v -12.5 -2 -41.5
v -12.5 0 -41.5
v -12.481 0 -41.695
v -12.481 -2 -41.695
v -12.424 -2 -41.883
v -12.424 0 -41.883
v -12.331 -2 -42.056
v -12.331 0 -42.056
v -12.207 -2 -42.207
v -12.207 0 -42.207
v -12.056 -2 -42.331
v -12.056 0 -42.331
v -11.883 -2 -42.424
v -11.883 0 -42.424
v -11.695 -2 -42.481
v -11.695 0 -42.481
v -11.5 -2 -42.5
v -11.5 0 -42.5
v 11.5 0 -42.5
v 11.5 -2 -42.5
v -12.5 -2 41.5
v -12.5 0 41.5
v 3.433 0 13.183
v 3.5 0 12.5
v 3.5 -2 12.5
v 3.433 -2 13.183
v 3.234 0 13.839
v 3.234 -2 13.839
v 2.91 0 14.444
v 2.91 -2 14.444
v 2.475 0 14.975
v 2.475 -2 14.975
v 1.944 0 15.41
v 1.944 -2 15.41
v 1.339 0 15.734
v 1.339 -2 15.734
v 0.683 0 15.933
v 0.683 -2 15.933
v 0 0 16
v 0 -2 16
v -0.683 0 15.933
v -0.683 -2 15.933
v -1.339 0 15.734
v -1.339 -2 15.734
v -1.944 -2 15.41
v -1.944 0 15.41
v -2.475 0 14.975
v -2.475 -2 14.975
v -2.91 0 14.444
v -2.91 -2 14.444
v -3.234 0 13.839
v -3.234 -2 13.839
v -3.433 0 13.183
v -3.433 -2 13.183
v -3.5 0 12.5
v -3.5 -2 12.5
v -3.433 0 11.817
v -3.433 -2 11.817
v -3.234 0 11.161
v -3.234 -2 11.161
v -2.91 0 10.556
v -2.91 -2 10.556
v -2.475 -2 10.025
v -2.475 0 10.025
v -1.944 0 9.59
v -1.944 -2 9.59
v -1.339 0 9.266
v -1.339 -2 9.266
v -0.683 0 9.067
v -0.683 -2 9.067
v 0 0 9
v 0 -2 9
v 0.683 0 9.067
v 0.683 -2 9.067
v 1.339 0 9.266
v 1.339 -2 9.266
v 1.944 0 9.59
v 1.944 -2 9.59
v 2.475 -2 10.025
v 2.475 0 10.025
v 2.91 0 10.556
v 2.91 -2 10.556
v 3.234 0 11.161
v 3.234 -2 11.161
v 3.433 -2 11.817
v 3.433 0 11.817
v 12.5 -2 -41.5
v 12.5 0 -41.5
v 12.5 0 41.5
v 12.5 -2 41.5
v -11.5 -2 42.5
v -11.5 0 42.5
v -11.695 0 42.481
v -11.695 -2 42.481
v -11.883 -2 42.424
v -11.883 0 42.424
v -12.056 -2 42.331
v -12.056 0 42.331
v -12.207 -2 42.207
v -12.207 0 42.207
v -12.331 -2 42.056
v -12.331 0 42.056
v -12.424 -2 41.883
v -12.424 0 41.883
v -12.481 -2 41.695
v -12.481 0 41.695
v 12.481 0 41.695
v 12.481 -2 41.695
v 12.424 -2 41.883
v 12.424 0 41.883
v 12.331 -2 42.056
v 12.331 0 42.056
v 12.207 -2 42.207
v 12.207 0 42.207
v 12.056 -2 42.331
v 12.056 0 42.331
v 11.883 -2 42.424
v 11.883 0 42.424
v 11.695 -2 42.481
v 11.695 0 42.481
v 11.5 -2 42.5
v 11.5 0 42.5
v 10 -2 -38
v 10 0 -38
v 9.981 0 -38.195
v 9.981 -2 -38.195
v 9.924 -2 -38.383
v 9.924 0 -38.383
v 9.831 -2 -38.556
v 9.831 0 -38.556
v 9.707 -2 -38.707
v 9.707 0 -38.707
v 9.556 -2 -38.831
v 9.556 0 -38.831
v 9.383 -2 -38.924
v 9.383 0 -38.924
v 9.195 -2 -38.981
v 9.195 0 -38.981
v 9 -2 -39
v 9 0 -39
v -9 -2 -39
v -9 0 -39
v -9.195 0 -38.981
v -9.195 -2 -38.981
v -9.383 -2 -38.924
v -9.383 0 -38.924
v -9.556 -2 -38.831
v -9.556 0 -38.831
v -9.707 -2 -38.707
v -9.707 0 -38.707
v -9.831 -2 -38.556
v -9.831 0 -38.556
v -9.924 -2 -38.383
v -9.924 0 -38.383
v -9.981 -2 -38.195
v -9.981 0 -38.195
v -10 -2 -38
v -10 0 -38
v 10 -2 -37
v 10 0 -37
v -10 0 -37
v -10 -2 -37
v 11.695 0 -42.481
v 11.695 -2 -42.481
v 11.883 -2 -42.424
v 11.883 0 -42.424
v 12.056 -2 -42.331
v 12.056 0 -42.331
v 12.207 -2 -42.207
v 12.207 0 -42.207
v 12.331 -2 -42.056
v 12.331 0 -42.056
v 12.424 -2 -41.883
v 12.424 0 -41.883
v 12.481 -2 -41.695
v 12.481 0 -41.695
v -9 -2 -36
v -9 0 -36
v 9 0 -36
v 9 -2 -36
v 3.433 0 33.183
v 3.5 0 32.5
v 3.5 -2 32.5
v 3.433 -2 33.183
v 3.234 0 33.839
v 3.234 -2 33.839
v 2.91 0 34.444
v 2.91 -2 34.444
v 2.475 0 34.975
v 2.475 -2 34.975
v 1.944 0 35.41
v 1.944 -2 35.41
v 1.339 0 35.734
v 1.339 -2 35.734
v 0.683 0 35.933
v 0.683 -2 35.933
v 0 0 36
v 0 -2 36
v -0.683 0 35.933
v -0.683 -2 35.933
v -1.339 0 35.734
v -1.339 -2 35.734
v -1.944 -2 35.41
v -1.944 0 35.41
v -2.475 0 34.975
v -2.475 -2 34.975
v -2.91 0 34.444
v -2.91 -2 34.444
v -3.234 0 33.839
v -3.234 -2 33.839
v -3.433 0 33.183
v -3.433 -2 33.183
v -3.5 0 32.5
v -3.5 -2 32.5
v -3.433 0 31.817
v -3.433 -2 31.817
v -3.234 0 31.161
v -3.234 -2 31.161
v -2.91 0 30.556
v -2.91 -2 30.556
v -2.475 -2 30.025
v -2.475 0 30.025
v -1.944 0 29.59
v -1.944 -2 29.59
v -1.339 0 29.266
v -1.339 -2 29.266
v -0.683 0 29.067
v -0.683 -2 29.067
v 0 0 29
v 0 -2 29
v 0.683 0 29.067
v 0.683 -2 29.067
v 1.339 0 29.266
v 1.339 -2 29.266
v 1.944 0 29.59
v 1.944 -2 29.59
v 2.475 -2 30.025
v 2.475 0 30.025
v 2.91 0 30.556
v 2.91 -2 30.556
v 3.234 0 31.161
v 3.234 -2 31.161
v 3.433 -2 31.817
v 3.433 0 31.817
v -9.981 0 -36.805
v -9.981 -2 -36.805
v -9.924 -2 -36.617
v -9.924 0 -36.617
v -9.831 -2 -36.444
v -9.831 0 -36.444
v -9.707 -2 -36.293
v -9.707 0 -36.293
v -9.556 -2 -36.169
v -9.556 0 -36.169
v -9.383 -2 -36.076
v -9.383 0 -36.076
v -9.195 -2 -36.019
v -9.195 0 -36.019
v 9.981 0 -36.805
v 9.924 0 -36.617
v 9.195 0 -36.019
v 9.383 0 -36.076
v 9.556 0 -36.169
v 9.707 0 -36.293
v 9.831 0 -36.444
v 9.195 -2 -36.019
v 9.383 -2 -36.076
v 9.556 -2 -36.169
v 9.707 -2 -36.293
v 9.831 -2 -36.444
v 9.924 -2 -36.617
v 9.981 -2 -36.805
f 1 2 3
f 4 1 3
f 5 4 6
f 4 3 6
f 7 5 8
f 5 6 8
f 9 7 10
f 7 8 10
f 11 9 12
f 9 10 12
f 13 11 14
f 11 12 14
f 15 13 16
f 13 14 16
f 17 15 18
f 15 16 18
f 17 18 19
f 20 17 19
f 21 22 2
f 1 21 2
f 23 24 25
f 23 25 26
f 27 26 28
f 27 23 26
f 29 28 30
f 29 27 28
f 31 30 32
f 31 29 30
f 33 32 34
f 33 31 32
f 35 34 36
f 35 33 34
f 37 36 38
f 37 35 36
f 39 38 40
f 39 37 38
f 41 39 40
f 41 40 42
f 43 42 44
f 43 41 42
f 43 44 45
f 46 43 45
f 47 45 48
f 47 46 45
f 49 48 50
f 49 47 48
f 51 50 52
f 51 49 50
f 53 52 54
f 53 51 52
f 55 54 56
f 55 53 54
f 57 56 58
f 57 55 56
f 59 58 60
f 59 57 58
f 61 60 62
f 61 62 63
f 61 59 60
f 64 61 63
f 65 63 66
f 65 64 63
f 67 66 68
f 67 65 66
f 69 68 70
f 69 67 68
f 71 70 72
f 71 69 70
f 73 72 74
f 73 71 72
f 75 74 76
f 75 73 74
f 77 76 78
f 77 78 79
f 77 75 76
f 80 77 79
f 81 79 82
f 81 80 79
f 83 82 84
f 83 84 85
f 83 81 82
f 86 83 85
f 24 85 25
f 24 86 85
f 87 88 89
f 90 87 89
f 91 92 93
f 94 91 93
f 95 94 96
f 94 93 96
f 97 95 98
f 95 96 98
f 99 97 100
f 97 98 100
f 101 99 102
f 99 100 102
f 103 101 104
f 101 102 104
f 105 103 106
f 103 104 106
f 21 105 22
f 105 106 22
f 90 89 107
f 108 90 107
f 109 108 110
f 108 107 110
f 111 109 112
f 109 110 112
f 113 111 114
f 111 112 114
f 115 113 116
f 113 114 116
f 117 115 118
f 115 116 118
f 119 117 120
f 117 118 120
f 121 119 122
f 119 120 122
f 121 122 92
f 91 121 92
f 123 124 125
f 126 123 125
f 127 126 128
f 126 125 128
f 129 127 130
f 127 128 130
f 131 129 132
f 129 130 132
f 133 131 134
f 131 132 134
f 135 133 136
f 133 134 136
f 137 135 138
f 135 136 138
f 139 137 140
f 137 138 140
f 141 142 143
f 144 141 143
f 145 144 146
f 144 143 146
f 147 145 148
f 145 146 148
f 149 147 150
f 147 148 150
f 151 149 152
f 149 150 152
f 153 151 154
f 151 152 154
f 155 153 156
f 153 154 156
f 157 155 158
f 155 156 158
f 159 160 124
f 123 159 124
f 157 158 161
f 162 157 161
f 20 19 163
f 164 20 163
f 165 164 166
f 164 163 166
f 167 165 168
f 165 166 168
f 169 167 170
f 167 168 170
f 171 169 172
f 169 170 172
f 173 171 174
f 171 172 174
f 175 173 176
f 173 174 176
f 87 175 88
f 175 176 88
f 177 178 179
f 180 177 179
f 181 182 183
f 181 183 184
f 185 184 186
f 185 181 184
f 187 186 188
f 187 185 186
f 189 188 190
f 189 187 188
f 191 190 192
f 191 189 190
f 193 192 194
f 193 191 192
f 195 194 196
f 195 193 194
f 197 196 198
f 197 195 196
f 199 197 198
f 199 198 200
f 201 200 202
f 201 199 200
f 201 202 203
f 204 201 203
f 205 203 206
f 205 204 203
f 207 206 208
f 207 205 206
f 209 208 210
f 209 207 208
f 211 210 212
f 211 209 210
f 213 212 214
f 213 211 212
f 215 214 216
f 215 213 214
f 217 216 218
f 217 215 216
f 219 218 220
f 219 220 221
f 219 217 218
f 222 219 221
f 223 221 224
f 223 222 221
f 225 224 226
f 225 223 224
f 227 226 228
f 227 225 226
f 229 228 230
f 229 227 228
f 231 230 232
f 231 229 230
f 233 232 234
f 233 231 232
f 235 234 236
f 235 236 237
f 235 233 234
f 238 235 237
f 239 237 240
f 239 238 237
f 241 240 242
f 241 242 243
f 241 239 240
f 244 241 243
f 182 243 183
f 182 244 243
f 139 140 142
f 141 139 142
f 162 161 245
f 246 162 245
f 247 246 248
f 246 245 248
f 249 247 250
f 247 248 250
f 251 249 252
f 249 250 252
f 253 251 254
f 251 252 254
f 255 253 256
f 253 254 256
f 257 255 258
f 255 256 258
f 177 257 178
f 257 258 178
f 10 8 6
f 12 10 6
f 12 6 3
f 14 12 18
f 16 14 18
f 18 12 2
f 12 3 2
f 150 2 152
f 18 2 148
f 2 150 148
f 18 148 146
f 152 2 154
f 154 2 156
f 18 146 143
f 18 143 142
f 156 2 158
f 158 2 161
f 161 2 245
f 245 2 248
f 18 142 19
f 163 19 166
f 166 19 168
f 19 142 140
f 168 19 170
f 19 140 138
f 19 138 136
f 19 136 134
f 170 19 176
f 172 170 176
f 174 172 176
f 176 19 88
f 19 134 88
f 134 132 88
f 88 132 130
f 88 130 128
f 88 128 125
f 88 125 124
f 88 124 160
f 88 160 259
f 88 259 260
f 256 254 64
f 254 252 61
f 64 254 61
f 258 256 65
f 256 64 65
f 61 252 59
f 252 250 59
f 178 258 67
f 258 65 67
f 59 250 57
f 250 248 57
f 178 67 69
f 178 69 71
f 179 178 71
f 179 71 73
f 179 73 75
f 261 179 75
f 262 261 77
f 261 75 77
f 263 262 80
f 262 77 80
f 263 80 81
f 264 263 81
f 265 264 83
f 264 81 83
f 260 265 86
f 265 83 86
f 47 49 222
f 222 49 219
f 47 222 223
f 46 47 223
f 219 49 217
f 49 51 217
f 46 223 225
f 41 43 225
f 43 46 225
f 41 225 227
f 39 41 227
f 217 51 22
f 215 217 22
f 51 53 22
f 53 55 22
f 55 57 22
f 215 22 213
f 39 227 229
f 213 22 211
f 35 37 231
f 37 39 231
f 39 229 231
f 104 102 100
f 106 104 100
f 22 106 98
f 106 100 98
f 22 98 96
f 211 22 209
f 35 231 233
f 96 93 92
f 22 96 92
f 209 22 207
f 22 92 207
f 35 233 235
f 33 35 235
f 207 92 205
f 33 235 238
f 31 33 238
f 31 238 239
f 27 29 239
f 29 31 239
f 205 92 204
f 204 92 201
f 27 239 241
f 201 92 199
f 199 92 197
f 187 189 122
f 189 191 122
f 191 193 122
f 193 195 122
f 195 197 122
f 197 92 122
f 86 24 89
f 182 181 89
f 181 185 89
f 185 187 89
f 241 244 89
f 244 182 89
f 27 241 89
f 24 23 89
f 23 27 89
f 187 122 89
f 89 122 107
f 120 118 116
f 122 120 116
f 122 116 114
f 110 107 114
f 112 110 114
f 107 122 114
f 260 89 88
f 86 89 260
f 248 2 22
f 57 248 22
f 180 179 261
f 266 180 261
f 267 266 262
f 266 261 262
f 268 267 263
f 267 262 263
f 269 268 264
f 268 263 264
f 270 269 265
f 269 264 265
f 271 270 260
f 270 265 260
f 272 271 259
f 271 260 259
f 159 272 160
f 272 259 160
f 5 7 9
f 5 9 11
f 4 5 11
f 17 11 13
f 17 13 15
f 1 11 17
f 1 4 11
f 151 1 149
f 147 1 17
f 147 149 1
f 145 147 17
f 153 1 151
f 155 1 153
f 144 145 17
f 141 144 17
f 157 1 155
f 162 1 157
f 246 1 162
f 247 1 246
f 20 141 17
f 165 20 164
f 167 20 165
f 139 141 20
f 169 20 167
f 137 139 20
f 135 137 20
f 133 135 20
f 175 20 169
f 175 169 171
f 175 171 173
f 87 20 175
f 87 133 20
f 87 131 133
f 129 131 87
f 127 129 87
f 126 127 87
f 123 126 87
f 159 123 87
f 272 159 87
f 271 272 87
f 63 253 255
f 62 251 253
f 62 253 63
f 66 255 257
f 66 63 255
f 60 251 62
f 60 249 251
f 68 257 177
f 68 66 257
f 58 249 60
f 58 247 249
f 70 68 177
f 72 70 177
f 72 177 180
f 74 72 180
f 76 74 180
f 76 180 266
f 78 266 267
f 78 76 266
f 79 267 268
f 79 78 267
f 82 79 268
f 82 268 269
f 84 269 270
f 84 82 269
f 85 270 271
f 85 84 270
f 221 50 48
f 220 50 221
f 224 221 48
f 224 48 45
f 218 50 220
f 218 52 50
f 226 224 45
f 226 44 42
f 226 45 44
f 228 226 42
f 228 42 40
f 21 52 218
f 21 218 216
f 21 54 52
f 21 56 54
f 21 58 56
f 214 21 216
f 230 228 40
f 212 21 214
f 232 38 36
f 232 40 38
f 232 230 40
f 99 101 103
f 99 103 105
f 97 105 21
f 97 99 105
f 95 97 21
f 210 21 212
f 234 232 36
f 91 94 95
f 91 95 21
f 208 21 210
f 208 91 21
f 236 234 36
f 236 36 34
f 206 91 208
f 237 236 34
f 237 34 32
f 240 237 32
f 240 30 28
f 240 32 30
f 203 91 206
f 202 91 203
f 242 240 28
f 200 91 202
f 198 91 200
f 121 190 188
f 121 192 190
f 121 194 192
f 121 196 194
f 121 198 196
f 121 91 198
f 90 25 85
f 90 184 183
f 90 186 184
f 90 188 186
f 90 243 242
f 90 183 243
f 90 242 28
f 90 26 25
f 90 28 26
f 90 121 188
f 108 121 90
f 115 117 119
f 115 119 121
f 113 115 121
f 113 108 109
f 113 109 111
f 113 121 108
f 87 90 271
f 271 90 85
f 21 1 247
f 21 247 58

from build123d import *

# Parameters (mm, degrees)
F0_R     = 3.5
F1_DEPTH = 2


with BuildPart() as f1:
    # F0 (on Front) → F1 (new body)
    with BuildSketch(Plane.XZ):
        with BuildLine():
            Line((-11.5, -42.5), (11.5, -42.5))
            ThreePointArc((11.5, -42.5), (12.207107, -42.207107), (12.5, -41.5))
            Line((12.5, -41.5), (12.5, 41.5))
            ThreePointArc((12.5, 41.5), (12.207107, 42.207107), (11.5, 42.5))
            Line((11.5, 42.5), (-11.5, 42.5))
            ThreePointArc((-11.5, 42.5), (-12.207107, 42.207107), (-12.5, 41.5))
            Line((-12.5, 41.5), (-12.5, -41.5))
            ThreePointArc((-12.5, -41.5), (-12.207107, -42.207107), (-11.5, -42.5))
        make_face()
        with BuildLine():
            ThreePointArc((10, -38), (9.707107, -38.707107), (9, -39))
            Line((9, -39), (-9, -39))
            ThreePointArc((-9, -39), (-9.707107, -38.707107), (-10, -38))
            Line((-10, -38), (-10, -37))
            ThreePointArc((-10, -37), (-9.707107, -36.292893), (-9, -36))
            Line((-9, -36), (9, -36))
            ThreePointArc((9, -36), (9.707107, -36.292893), (10, -37))
            Line((10, -37), (10, -38))
        make_face(mode=Mode.SUBTRACT)
        with Locations((0, 12.5)):
            Circle(F0_R, mode=Mode.SUBTRACT)
        with Locations((0, 32.5)):
            Circle(F0_R, mode=Mode.SUBTRACT)
    extrude(amount=F1_DEPTH)


solid = f1.part
